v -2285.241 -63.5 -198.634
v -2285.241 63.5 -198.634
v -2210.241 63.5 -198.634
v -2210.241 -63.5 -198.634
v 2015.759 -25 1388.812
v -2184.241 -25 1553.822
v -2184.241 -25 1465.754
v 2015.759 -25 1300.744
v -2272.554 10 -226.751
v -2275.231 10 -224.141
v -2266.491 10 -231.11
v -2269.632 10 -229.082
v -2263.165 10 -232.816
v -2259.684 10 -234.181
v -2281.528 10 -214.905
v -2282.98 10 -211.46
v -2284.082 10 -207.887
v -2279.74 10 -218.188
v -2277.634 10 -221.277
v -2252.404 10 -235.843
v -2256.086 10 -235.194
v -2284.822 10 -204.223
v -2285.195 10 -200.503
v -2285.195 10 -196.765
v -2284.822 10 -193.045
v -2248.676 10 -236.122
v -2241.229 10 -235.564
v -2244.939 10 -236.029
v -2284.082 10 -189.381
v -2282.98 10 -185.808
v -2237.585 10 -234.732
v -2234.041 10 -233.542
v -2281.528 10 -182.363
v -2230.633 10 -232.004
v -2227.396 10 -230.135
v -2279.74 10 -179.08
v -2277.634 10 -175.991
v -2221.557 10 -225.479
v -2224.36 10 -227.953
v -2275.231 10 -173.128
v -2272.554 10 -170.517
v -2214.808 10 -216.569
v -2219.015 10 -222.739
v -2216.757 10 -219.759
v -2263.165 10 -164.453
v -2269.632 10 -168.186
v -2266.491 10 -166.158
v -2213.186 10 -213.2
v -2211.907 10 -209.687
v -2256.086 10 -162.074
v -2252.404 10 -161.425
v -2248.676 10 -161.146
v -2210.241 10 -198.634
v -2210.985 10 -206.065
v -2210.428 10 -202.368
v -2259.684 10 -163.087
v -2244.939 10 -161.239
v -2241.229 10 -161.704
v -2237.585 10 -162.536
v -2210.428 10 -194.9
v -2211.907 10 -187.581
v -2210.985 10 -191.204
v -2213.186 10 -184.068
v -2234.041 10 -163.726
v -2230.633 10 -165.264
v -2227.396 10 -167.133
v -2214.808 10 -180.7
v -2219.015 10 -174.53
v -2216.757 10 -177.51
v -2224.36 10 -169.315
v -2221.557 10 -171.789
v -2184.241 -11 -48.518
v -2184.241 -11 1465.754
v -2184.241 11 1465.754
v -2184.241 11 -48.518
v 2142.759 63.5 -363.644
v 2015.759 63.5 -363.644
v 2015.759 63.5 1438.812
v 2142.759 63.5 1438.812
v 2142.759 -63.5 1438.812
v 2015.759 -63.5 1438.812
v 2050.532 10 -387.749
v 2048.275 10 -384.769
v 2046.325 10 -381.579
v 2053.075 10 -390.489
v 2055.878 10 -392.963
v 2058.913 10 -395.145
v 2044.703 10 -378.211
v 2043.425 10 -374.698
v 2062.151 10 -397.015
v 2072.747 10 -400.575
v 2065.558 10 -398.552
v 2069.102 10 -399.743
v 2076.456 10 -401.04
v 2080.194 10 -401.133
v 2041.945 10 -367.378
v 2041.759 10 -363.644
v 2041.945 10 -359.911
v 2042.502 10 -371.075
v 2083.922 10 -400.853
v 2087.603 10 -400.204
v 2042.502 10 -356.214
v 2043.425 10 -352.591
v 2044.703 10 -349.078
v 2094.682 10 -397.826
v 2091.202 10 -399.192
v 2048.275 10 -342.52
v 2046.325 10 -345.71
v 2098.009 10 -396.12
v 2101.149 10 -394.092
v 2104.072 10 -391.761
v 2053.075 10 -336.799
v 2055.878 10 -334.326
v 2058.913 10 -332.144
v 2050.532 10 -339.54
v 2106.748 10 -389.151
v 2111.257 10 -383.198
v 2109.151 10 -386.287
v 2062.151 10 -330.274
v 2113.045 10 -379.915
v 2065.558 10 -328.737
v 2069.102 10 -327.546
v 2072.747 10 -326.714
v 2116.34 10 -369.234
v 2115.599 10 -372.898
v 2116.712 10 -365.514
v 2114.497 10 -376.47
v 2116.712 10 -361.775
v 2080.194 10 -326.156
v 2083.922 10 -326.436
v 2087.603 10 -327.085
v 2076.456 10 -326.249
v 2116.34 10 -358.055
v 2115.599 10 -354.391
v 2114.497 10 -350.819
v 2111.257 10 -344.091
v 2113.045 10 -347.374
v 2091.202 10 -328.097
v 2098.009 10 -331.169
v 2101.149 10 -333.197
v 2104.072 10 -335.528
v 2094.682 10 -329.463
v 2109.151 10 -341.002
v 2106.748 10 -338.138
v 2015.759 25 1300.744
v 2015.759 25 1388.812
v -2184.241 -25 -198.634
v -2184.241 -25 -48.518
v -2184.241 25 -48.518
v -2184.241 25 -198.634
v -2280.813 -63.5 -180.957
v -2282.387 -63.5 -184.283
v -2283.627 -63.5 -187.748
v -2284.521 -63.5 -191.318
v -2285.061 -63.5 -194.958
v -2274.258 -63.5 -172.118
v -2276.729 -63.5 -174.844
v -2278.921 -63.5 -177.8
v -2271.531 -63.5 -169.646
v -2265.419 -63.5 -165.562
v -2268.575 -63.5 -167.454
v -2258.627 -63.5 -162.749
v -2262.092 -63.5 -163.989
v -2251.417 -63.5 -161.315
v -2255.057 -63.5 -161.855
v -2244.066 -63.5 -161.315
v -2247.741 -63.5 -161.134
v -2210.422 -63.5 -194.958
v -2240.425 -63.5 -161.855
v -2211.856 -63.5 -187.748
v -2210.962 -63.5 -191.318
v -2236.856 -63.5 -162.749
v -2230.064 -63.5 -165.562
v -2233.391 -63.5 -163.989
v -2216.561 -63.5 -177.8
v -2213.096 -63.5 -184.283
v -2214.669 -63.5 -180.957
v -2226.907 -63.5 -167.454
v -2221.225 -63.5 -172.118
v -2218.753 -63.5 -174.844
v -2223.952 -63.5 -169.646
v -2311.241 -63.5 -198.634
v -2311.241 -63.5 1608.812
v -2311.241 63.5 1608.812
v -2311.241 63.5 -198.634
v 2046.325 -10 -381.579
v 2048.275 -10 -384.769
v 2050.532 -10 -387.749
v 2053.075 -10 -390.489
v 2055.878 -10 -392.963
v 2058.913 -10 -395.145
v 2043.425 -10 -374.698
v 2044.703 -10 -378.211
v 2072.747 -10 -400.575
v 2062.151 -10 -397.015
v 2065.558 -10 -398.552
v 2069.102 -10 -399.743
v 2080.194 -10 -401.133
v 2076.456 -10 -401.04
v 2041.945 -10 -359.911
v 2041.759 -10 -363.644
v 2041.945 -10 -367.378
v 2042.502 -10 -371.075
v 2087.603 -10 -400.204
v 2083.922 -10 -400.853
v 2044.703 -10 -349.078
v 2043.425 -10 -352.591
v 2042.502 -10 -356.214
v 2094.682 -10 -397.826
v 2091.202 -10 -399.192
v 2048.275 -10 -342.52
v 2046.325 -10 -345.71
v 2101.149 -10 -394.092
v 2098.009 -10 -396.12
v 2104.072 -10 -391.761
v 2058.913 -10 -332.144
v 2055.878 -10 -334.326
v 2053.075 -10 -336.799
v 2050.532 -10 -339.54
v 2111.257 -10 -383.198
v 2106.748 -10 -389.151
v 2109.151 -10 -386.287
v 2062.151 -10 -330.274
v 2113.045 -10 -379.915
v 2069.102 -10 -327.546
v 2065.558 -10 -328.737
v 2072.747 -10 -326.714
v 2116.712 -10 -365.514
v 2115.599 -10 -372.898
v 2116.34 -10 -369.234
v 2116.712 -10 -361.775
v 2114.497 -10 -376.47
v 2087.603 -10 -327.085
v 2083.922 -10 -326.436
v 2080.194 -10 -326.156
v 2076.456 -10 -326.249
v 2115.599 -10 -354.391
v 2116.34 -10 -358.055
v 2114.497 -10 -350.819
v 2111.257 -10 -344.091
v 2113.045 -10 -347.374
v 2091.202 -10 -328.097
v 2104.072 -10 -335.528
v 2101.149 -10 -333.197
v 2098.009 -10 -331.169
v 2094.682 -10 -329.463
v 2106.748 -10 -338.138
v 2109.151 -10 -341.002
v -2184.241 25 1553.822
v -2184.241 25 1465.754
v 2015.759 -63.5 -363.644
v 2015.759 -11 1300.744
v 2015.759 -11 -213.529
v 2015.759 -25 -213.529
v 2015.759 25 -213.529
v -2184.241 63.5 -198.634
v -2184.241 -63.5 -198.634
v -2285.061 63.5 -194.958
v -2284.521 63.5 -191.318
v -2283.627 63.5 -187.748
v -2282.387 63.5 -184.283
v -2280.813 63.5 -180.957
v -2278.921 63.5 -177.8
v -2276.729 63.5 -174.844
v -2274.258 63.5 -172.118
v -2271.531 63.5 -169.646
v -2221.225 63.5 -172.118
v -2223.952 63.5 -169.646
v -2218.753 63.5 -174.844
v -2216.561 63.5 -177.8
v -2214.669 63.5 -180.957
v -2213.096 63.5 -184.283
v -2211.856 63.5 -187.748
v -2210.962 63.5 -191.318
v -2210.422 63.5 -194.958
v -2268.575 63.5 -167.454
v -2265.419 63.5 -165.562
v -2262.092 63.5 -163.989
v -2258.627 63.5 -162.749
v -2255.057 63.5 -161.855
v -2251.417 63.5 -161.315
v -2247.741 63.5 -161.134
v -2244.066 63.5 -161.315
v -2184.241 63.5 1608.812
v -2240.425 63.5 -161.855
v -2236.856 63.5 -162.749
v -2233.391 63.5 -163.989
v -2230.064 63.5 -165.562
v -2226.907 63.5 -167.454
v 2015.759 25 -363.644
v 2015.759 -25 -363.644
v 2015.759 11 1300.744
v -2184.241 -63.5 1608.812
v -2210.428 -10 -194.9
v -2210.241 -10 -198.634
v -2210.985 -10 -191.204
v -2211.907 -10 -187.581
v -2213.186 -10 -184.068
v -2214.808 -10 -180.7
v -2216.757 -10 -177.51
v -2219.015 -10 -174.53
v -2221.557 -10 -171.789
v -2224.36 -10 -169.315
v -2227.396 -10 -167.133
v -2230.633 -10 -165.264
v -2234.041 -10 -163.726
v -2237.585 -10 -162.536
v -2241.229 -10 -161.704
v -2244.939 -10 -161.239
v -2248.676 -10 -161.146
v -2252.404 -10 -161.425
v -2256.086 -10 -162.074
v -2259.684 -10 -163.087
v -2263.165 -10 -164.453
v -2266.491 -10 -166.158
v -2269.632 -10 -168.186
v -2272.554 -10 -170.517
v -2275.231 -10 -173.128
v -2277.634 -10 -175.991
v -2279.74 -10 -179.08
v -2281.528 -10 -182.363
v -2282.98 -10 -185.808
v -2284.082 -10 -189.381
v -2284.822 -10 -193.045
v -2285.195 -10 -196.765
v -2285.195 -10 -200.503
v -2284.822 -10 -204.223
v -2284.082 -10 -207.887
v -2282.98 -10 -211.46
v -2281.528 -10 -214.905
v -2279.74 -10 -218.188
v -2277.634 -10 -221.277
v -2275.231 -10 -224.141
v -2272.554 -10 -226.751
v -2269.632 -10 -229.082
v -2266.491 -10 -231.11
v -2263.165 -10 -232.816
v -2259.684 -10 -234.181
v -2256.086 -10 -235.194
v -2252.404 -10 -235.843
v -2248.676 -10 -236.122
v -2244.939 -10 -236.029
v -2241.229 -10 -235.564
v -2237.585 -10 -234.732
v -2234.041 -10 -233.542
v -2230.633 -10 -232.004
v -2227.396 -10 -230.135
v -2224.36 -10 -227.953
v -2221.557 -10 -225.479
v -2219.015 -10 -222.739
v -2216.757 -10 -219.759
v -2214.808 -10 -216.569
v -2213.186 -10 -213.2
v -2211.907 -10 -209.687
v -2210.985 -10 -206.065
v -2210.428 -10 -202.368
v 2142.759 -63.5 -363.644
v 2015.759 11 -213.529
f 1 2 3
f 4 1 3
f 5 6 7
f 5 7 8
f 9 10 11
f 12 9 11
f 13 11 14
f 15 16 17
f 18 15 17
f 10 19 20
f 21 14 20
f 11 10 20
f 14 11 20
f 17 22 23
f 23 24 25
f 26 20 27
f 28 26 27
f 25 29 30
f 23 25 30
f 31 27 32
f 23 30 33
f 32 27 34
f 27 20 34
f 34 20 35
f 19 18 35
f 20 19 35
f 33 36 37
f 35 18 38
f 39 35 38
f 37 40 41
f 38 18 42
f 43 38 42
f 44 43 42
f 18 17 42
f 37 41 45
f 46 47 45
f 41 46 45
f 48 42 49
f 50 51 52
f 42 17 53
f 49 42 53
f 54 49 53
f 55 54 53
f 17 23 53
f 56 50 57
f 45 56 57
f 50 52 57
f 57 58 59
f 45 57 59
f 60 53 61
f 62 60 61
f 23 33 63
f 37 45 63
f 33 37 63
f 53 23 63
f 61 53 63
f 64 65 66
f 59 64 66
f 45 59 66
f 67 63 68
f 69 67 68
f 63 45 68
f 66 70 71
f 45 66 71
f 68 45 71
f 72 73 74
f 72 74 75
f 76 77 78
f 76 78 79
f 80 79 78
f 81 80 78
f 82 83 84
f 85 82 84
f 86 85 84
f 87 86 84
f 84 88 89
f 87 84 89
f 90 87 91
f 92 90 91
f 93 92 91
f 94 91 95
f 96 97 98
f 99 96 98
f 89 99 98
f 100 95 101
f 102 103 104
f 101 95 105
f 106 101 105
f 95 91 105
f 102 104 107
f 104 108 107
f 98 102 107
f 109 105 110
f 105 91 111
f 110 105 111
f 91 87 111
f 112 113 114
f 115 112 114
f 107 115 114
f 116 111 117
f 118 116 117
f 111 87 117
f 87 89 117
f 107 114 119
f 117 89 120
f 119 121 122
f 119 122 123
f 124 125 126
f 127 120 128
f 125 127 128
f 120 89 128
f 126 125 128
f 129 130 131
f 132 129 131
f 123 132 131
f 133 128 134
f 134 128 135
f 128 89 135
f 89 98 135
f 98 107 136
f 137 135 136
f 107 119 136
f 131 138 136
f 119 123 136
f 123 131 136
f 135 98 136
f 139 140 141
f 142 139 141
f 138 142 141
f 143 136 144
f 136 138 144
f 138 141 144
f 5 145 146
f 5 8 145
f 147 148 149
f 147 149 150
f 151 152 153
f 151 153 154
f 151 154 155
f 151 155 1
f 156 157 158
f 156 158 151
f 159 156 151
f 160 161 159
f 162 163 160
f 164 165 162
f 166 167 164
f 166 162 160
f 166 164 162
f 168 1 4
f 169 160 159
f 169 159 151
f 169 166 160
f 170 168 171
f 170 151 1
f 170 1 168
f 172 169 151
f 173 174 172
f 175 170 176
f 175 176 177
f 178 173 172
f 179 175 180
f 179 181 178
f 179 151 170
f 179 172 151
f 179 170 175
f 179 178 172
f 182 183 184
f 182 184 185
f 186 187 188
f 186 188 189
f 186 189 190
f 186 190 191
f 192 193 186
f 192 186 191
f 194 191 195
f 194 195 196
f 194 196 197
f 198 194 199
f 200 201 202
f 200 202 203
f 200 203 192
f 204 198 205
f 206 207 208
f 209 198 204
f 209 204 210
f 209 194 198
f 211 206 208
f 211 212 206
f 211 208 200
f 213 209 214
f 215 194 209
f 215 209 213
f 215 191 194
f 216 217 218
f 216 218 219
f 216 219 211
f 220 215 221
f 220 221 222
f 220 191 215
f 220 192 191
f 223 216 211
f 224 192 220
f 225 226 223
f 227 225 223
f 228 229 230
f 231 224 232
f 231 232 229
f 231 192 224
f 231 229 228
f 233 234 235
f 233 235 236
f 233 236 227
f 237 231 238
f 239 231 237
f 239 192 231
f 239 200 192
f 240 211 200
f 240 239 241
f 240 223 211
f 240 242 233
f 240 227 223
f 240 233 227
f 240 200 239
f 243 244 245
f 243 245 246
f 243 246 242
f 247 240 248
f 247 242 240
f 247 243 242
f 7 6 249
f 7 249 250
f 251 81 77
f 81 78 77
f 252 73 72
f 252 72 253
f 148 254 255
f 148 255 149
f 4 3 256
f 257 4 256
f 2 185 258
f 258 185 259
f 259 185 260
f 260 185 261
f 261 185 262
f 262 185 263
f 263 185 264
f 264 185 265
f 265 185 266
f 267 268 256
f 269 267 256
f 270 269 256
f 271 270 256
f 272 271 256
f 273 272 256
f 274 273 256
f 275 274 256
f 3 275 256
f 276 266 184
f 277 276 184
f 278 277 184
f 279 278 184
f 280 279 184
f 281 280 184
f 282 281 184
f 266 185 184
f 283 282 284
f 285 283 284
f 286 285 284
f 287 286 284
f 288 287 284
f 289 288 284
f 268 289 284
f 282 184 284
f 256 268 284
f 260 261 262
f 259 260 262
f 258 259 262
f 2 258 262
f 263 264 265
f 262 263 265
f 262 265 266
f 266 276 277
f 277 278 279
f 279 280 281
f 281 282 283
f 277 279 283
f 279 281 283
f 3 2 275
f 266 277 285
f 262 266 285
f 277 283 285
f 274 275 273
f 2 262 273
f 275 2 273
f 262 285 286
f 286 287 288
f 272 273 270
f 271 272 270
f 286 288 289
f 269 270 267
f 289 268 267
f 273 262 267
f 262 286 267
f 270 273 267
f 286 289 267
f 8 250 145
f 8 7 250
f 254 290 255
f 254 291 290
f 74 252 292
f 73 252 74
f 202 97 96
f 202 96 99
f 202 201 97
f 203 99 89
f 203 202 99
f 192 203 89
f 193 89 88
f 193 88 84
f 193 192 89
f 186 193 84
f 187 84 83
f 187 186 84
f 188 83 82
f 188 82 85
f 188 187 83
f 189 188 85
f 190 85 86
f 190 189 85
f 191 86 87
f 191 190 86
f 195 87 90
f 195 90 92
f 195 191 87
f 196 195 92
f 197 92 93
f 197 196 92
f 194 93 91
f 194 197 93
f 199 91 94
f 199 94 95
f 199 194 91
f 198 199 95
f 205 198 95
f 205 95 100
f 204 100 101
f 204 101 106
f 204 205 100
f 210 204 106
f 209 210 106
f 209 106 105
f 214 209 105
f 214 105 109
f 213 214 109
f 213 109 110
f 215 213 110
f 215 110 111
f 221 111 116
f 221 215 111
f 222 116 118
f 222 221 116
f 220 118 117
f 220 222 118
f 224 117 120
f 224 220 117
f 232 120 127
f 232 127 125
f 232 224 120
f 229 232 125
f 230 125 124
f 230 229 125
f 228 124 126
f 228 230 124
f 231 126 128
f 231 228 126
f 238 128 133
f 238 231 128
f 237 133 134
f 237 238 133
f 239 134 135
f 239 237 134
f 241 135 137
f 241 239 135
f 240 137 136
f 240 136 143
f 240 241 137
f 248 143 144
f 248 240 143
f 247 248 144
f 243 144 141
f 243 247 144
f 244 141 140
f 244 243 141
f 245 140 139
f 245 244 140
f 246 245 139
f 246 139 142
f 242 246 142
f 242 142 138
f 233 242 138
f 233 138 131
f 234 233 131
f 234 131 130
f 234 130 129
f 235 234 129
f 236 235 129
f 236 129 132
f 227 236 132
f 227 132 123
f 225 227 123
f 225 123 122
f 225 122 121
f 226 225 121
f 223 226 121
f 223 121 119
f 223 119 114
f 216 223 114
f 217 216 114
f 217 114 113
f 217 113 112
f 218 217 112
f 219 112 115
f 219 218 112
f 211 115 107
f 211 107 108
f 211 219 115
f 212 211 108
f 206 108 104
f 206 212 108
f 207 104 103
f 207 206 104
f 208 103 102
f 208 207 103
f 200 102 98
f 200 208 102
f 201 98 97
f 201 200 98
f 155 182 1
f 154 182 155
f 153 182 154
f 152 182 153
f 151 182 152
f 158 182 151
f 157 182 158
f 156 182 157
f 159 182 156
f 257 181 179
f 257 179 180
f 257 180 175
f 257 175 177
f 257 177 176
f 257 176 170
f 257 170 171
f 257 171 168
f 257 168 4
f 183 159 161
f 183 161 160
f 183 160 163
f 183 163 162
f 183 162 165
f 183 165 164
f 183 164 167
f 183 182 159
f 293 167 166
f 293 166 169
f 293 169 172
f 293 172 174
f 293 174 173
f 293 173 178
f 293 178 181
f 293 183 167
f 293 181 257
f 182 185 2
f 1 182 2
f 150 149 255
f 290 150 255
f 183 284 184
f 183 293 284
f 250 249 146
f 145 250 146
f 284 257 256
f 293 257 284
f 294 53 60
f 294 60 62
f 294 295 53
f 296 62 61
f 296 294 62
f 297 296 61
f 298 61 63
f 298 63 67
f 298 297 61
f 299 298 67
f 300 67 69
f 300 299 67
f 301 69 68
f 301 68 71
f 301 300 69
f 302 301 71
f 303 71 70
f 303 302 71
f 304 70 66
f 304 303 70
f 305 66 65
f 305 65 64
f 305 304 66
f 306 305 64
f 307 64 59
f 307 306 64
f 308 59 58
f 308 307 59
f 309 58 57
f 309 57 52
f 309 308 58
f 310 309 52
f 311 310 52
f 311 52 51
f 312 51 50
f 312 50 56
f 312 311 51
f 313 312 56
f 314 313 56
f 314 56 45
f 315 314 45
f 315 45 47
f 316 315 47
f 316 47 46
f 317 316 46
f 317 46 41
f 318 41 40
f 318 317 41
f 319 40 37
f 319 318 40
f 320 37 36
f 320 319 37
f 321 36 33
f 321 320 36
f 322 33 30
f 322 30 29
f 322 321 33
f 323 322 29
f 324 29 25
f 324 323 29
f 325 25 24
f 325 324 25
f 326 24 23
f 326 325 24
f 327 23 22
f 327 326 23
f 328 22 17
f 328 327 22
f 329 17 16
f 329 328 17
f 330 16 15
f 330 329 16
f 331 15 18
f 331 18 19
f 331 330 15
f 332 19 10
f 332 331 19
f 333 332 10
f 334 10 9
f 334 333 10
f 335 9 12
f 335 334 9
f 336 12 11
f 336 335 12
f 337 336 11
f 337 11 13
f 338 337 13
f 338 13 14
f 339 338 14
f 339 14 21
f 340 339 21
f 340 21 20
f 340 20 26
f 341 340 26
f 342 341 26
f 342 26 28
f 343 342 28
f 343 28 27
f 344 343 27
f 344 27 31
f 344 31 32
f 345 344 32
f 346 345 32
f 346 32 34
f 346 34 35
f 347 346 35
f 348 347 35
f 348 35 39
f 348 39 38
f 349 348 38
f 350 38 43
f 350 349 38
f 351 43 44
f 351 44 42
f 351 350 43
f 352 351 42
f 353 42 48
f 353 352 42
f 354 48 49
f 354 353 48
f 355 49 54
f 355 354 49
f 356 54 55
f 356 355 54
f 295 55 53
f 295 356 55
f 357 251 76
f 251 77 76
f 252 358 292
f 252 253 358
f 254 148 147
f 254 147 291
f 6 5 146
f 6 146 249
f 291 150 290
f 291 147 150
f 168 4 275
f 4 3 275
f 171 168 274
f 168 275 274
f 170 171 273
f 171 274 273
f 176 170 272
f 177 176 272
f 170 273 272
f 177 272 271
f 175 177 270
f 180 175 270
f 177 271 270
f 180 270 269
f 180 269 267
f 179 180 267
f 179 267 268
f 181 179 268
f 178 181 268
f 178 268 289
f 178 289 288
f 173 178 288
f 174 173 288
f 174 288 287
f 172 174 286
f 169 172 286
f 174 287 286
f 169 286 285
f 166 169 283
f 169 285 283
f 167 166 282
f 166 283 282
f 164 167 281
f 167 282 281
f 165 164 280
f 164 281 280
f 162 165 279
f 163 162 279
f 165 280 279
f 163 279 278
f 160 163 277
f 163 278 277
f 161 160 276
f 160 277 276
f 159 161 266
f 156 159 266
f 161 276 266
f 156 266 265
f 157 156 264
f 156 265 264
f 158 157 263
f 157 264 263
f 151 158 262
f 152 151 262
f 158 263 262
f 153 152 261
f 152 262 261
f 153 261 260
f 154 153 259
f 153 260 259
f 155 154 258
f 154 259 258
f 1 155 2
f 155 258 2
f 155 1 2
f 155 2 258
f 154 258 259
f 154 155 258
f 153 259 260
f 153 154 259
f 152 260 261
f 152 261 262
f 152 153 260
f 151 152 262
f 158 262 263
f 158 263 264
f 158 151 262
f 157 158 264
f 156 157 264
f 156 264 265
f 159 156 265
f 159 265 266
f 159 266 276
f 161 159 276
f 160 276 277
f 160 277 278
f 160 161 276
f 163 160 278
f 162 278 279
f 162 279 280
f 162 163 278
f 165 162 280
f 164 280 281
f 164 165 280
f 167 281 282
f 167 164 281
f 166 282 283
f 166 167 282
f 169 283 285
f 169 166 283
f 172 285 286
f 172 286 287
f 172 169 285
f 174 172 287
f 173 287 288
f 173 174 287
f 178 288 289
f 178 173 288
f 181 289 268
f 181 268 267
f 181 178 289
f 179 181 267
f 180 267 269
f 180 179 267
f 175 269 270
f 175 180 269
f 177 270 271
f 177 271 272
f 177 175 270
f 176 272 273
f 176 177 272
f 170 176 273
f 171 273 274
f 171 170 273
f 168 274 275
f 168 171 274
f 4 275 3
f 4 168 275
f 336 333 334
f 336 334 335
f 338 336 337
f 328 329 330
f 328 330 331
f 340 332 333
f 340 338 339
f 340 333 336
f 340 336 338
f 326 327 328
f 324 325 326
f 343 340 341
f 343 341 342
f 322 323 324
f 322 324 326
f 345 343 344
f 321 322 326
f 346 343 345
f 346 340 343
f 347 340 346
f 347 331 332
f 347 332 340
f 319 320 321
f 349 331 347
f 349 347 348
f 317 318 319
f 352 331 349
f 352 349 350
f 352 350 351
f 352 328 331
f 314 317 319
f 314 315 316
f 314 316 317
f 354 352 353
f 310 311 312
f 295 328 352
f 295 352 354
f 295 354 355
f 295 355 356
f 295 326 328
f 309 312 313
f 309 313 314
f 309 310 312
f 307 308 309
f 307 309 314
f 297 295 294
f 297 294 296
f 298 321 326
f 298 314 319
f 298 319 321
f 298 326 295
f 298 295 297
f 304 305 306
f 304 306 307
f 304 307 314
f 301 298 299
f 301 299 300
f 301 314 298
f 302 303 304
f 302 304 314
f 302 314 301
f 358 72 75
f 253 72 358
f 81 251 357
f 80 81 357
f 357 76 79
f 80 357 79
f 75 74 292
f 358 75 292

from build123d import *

# Parameters (mm, degrees)
F1_DEPTH      = 63.5
F1_DEPTH_BACK = 63.5
F2_DEPTH      = 10
F2_DEPTH_BACK = 10
F3_DEPTH      = 25
F3_DEPTH_BACK = 25
F4_DEPTH      = 11
F4_DEPTH_BACK = 11
F5_DEPTH      = 63.5
F5_DEPTH_BACK = 63.5


# Not quite as in the source:
# - a feature names something its author has since deleted; it is built from what else it names


with BuildPart() as f1:
    # F0 (on Front) → F1 (new body, two sides)
    with BuildSketch(Plane.XZ) as f1_sk:
        with BuildLine():
            Line((2142.7587509155, 1438.8117480311), (2015.7587509155, 1438.8117480311))
            Line((2015.7587509155, 1438.8117480311), (2015.7587509155, 1388.8117480311))
            Line((2015.7587509155, 1388.8117480311), (2015.7587509155, 1300.7438574954))
            Line((2015.7587509155, 1300.7438574954), (2015.7587509155, -213.5287553892))
            Line((2015.7587509155, -213.5287553892), (2015.7587509155, -363.6444778933))
            Line((2015.7587509155, -363.6444778933), (2041.7587509155, -363.6444778933))
            ThreePointArc((2041.7587509155, -363.6444778933), (2079.2587509155, -326.1444778933), (2116.7587509155, -363.6444778933))
            Line((2116.7587509155, -363.6444778933), (2142.7587509155, -363.6444778933))
            Line((2142.7587509155, -363.6444778933), (2142.7587509155, 1438.8117480311))
        make_face()
        with BuildLine():
            Line((2041.7587509155, -363.6444778933), (2116.7587509155, -363.6444778933))
            ThreePointArc((2116.7587509155, -363.6444778933), (2079.2587509155, -326.1444778933), (2041.7587509155, -363.6444778933))
        make_face()
    extrude(amount=-F1_DEPTH)
    extrude(f1_sk.sketch, amount=F1_DEPTH_BACK)


with BuildPart() as f1b:
    # F0 (on Front) → F1, piece 2 (new body, two sides)
    with BuildSketch(Plane.XZ) as f1_2_sk:
        with BuildLine():
            Line((-2285.2412490845, -198.6340780782), (-2210.2412490845, -198.6340780782))
            ThreePointArc((-2210.2412490845, -198.6340780782), (-2247.7412490845, -161.1340780782), (-2285.2412490845, -198.6340780782))
        make_face()
    extrude(amount=-F1_DEPTH)
    extrude(f1_2_sk.sketch, amount=F1_DEPTH_BACK)


with BuildPart() as f2:
    # F0 (on Front) → F2 (new body, two sides)
    with BuildSketch(Plane.XZ) as f2_sk:
        with BuildLine():
            ThreePointArc((-2285.2412490845, -198.6340780782), (-2247.7412490845, -236.1340780782), (-2210.2412490845, -198.6340780782))
            Line((-2210.2412490845, -198.6340780782), (-2285.2412490845, -198.6340780782))
        make_face()
        with BuildLine():
            Line((-2285.2412490845, -198.6340780782), (-2210.2412490845, -198.6340780782))
            ThreePointArc((-2210.2412490845, -198.6340780782), (-2247.7412490845, -161.1340780782), (-2285.2412490845, -198.6340780782))
        make_face()
    extrude(amount=F2_DEPTH)
    extrude(f2_sk.sketch, amount=-F2_DEPTH_BACK)


with BuildPart() as f2b:
    # F0 (on Front) → F2, piece 2 (new body, two sides)
    with BuildSketch(Plane.XZ) as f2_2_sk:
        with BuildLine():
            Line((2041.7587509155, -363.6444778933), (2116.7587509155, -363.6444778933))
            ThreePointArc((2116.7587509155, -363.6444778933), (2079.2587509155, -326.1444778933), (2041.7587509155, -363.6444778933))
        make_face()
        with BuildLine():
            ThreePointArc((2041.7587509155, -363.6444778933), (2079.2587509155, -401.1444778933), (2116.7587509155, -363.6444778933))
            Line((2116.7587509155, -363.6444778933), (2041.7587509155, -363.6444778933))
        make_face()
    extrude(amount=F2_DEPTH)
    extrude(f2_2_sk.sketch, amount=-F2_DEPTH_BACK)


with BuildPart() as f3:
    # F0 (on Front) → F3 (new body, two sides)
    with BuildSketch(Plane.XZ) as f3_sk:
        Polygon((2015.7587509155, -363.6444778933), (2015.7587509155, -213.5287553892), (-2184.2412490845, -48.5183555741), (-2184.2412490845, -198.6340780782), align=None)
    extrude(amount=F3_DEPTH)
    extrude(f3_sk.sketch, amount=-F3_DEPTH_BACK)


with BuildPart() as f3b:
    # F0 (on Front) → F3, piece 2 (new body, two sides)
    with BuildSketch(Plane.XZ) as f3_2_sk:
        Polygon((2015.7587509155, 1300.7438574954), (2015.7587509155, 1388.8117480311), (-2184.2412490845, 1553.8221478462), (-2184.2412490845, 1465.7542573105), align=None)
    extrude(amount=F3_DEPTH)
    extrude(f3_2_sk.sketch, amount=-F3_DEPTH_BACK)


with BuildPart() as f4:
    # F0 (on Front) → F4 (new body, two sides)
    with BuildSketch(Plane.XZ) as f4_sk:
        Polygon((2015.7587509155, -213.5287553892), (2015.7587509155, 1300.7438574954), (-2184.2412490845, 1465.7542573105), (-2184.2412490845, -48.5183555741), align=None)
    extrude(amount=F4_DEPTH)
    extrude(f4_sk.sketch, amount=-F4_DEPTH_BACK)


with BuildPart() as f5:
    # F0 (on Front) → F5 (new body, two sides)
    with BuildSketch(Plane.XZ) as f5_sk:
        with BuildLine():
            Line((-2184.2412490845, 1465.7542573105), (-2184.2412490845, 1553.8221478462))
            Line((-2184.2412490845, 1553.8221478462), (-2184.2412490845, 1603.8221478462))
            Line((-2184.2412490845, 1603.8221478462), (-2184.2412490845, 1608.8117480311))
            Line((-2184.2412490845, 1608.8117480311), (-2311.2412490845, 1608.8117480311))
            Line((-2311.2412490845, 1608.8117480311), (-2311.2412490845, -198.6340780782))
            Line((-2311.2412490845, -198.6340780782), (-2285.2412490845, -198.6340780782))
            ThreePointArc((-2285.2412490845, -198.6340780782), (-2247.7412490845, -161.1340780782), (-2210.2412490845, -198.6340780782))
            Line((-2210.2412490845, -198.6340780782), (-2184.2412490845, -198.6340780782))
            Line((-2184.2412490845, -198.6340780782), (-2184.2412490845, -48.5183555741))
            Line((-2184.2412490845, -48.5183555741), (-2184.2412490845, 1465.7542573105))
        make_face()
    extrude(amount=F5_DEPTH)
    extrude(f5_sk.sketch, amount=-F5_DEPTH_BACK)


solid = Compound([f1.part, f1b.part, f2.part, f2b.part, f3.part, f3b.part, f4.part, f5.part])
